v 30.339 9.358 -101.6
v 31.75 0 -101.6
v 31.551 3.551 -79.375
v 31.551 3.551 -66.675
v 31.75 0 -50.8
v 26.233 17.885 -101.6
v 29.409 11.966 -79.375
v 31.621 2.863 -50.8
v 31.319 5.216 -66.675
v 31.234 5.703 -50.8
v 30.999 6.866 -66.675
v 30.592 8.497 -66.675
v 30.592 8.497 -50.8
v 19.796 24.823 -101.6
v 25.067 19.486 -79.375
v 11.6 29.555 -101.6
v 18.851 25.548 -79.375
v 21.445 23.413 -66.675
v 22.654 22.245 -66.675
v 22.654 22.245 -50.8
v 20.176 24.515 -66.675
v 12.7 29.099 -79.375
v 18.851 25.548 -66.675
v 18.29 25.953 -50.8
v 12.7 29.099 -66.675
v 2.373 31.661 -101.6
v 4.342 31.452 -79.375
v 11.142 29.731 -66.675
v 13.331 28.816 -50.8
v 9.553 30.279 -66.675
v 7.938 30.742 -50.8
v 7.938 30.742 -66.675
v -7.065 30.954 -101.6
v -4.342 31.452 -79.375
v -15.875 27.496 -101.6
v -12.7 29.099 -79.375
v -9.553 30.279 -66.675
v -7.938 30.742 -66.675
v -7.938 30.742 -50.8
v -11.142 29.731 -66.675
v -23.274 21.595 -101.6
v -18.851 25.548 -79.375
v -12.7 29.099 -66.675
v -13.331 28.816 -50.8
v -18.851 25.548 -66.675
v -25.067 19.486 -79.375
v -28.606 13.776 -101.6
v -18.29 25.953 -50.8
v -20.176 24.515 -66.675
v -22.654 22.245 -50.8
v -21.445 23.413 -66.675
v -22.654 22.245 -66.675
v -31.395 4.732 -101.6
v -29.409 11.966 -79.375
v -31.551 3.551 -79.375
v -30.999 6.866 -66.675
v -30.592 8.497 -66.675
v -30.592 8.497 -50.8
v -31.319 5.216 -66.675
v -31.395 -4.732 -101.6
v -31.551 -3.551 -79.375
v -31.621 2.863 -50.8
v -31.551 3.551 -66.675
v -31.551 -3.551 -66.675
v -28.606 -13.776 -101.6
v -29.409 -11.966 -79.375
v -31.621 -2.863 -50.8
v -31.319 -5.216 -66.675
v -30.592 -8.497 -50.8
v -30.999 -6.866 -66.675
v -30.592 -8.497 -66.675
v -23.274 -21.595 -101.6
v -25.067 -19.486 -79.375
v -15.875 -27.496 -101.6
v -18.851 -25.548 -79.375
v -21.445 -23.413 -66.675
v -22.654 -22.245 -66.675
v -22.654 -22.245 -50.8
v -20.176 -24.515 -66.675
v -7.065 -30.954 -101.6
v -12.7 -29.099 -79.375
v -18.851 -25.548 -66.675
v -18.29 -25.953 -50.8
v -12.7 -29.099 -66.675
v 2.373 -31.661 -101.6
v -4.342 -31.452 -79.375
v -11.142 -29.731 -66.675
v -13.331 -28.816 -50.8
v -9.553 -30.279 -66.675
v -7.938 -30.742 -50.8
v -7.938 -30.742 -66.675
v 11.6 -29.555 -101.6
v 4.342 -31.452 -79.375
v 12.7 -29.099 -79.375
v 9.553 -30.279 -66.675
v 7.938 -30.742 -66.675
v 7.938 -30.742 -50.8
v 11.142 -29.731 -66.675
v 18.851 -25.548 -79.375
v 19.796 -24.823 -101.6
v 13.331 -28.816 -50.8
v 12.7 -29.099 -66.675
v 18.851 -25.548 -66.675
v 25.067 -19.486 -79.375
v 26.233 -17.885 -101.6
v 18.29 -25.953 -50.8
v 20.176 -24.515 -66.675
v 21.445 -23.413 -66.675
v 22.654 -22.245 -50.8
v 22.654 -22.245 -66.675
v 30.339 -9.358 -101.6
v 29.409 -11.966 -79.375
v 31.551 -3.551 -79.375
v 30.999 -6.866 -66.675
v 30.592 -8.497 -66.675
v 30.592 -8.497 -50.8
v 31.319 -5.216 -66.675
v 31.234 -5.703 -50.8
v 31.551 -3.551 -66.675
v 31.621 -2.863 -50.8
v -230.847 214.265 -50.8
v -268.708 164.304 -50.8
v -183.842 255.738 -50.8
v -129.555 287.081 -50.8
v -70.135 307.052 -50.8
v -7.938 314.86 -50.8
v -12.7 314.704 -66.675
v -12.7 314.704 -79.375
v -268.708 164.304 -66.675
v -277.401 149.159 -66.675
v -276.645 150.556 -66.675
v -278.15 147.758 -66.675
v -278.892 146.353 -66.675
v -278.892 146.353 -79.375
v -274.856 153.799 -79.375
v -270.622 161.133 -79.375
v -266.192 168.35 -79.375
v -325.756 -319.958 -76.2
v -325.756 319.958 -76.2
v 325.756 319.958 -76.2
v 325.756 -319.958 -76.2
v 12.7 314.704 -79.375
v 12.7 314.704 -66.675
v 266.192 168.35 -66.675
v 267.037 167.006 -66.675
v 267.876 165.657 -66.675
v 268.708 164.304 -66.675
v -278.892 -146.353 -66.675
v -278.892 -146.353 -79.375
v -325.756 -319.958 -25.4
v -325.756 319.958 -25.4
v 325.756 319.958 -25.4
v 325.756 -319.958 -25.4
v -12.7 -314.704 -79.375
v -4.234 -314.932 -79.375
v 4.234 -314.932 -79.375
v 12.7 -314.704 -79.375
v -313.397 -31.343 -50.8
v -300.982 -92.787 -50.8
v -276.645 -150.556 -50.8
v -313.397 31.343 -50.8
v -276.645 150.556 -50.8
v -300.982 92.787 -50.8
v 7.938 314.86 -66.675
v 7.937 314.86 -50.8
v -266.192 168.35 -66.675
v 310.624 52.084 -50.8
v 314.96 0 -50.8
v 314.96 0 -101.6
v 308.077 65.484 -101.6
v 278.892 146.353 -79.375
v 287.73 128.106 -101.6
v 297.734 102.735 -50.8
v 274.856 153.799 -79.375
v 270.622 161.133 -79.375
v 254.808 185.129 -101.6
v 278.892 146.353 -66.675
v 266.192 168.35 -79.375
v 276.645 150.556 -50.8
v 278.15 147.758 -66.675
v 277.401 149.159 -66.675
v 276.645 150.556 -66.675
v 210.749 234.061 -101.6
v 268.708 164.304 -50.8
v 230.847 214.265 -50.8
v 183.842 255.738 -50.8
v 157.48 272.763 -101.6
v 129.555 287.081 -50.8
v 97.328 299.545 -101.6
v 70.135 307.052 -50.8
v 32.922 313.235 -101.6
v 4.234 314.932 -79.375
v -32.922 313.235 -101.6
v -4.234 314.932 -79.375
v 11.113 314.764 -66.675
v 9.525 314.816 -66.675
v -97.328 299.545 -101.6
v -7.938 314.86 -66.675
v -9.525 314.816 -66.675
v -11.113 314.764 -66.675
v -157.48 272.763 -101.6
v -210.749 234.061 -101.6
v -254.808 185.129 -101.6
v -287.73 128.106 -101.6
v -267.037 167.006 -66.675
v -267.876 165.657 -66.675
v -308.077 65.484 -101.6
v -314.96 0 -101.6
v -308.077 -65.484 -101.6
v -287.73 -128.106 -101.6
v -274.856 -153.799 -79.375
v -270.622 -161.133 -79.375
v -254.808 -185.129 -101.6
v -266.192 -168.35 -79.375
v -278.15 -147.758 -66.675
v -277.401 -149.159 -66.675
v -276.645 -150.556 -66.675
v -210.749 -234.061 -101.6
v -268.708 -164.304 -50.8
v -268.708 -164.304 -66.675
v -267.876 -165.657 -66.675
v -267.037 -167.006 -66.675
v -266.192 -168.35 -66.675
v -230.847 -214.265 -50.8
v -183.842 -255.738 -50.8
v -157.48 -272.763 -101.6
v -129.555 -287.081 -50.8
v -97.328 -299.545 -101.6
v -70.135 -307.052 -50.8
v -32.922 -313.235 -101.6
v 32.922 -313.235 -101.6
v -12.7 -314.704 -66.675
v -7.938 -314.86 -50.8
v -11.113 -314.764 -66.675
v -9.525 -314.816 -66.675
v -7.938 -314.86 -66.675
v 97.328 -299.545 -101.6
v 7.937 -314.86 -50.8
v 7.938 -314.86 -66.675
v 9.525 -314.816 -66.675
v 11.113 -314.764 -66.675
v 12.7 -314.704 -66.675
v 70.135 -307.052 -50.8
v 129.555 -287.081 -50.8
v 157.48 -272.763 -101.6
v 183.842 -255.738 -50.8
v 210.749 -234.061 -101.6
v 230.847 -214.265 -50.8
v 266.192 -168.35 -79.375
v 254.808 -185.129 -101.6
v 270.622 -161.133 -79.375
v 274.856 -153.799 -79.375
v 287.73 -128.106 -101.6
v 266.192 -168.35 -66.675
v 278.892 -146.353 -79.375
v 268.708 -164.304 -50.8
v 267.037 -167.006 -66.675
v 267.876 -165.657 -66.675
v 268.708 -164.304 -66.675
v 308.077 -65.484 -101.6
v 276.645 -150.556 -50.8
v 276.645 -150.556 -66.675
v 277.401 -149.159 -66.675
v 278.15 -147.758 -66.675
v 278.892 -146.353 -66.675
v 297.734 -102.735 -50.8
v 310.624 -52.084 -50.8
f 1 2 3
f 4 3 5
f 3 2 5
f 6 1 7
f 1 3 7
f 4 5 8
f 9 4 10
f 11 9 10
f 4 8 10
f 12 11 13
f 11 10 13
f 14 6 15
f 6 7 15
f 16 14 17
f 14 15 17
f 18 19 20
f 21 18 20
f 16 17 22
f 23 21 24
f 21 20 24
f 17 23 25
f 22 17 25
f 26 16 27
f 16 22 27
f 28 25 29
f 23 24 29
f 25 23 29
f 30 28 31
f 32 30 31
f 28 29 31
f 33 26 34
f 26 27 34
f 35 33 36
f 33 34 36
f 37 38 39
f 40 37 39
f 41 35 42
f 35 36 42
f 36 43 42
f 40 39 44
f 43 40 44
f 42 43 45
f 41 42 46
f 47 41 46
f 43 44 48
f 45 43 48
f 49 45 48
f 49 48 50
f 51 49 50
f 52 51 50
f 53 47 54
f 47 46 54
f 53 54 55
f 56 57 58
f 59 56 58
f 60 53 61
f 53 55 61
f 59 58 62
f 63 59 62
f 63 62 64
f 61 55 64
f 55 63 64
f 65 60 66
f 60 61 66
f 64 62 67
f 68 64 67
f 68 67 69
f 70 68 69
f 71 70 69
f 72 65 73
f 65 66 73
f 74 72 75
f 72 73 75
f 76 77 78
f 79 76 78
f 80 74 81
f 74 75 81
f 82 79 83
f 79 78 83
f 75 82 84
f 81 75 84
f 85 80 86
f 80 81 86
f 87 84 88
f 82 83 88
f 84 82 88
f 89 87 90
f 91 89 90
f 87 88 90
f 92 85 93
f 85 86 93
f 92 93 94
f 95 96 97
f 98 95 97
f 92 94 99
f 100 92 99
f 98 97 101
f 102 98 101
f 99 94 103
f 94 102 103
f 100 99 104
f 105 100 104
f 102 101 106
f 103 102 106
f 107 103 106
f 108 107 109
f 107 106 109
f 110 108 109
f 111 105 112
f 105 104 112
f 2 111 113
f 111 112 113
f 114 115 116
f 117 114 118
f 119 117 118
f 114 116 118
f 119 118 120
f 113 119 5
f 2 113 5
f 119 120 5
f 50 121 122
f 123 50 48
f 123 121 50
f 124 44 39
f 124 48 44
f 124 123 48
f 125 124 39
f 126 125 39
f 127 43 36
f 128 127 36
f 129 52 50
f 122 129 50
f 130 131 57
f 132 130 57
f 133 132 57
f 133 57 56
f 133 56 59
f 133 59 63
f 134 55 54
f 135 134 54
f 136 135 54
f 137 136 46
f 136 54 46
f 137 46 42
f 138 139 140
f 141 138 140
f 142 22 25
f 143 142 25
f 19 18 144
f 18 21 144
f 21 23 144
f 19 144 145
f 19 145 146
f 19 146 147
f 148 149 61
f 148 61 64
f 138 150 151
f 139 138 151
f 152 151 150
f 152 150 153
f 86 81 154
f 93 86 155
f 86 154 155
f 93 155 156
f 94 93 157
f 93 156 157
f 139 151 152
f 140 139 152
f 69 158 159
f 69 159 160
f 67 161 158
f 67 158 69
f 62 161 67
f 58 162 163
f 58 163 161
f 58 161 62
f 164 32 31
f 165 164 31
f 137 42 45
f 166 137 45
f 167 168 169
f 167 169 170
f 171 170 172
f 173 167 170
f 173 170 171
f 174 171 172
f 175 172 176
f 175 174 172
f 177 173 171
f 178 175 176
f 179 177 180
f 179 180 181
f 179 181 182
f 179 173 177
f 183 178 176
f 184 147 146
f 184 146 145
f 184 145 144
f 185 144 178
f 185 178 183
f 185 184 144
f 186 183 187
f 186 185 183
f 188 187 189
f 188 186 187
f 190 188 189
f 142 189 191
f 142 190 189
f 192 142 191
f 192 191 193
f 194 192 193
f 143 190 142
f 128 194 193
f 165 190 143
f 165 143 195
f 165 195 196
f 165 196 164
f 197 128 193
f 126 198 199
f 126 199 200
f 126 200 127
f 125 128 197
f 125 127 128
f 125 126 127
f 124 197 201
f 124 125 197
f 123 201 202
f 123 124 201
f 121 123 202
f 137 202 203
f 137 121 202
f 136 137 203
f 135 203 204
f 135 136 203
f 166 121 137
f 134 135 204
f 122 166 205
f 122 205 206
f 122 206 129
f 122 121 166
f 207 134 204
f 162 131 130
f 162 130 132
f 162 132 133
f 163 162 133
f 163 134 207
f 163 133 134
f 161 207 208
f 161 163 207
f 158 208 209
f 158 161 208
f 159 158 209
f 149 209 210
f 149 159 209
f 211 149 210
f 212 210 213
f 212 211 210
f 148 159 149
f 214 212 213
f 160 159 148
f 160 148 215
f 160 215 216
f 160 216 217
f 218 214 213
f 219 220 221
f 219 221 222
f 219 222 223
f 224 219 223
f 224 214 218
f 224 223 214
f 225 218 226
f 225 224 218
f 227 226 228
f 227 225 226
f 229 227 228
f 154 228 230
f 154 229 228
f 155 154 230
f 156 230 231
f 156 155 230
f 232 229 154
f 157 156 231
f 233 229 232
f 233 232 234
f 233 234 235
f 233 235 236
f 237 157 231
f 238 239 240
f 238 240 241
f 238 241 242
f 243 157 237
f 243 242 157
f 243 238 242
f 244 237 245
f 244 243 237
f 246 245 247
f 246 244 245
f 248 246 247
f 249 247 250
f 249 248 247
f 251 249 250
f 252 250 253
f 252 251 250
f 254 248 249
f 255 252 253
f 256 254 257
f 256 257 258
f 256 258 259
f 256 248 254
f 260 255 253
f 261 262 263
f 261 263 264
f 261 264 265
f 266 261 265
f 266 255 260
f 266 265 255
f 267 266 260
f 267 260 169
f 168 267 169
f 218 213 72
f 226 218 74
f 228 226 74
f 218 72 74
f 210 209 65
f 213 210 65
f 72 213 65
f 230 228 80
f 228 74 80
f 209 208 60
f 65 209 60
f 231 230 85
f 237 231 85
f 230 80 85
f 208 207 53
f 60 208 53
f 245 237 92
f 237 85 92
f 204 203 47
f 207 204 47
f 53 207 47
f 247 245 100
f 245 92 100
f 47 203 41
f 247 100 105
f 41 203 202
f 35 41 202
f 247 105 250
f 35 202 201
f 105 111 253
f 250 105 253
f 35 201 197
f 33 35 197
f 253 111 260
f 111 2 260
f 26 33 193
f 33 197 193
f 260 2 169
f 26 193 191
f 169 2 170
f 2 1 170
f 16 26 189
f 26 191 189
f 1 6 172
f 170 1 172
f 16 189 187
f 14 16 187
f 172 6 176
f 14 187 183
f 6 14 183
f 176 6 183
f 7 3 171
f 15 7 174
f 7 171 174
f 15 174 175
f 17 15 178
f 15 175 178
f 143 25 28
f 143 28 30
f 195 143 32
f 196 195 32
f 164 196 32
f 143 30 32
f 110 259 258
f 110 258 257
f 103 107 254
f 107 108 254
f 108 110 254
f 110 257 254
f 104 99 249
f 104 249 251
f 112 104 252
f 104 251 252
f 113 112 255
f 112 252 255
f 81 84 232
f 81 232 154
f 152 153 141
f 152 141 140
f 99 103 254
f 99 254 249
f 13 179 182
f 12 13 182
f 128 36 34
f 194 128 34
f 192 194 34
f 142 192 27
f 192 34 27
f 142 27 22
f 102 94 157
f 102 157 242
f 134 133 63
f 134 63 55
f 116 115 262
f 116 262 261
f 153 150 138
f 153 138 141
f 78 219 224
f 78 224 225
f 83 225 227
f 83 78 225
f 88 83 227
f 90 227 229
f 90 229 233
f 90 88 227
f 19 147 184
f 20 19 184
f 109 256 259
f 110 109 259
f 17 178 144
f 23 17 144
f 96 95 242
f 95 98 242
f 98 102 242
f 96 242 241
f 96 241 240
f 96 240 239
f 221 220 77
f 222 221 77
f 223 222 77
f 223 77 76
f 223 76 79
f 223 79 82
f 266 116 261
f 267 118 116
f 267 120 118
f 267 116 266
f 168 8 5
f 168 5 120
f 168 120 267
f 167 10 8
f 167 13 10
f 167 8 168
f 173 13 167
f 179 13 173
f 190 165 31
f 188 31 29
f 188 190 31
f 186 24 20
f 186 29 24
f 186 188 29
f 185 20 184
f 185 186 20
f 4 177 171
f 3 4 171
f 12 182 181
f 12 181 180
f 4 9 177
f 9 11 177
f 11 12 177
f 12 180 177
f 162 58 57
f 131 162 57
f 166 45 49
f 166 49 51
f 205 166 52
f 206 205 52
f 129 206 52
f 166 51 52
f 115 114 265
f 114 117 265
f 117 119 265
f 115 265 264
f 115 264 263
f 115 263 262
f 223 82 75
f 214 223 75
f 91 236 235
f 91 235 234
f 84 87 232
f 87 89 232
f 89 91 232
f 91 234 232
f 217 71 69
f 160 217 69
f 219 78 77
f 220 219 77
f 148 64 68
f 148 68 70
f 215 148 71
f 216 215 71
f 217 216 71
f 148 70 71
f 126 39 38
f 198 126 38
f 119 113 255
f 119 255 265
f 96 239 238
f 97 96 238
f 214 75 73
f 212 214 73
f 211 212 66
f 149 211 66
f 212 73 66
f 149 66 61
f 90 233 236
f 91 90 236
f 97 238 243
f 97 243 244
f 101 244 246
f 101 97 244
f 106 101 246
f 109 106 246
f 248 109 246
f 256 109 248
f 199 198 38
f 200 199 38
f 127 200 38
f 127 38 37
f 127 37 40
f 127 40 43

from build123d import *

# Parameters (mm, degrees)
F1_START        = -50.8
F0_R            = 314.96
F0_R_2          = 31.75
F1_DEPTH        = 50.8
F3_DEPTH        = 314.96
F3_COPIES_COUNT = 3
F3_COPIES_ANGLE = 120
F5_START        = -25.4
F4_W            = 651.5112519264
F4_H            = 639.9160027504
F5_DEPTH        = 50.8


# Not quite as in the source:
# - a pattern or mirror of a feature is missing from the dataset's text; its kind, count and spacing are read off the source's solid


with BuildPart() as f1:
    # F0 (on Top) → F1 (new body)
    with BuildSketch(Plane.XY.offset(F1_START)):
        Circle(F0_R)
        Circle(F0_R_2, mode=Mode.SUBTRACT)
    extrude(amount=-F1_DEPTH)

    # F2 (on Front) → F3 (cut, symmetric)
    with BuildSketch(Plane.XZ):
        Polygon((7.9375, -50.8), (0, -50.8), (-7.9375, -50.8), (-7.9375, -66.675), (-12.7, -66.675), (-12.7, -79.375), (0, -79.375), (12.7, -79.375), (12.7, -66.675), (7.9375, -66.675), align=None)
    f3 = extrude(amount=F3_DEPTH, both=True, mode=Mode.SUBTRACT)

    # F3_copies: F3 ×3 about axis
    f3_copies_axis = Axis((0, 0, 0), (0, 0, 1))
    for i in range(1, F3_COPIES_COUNT):
        add(f3.rotate(f3_copies_axis, i * F3_COPIES_ANGLE / (F3_COPIES_COUNT - 1)), mode=Mode.SUBTRACT)


with BuildPart() as f5:
    # F4 (on Top) → F5 (new body)
    with BuildSketch(Plane.XY.offset(F5_START)):
        Rectangle(F4_W, F4_H)
    extrude(amount=-F5_DEPTH)


solid = Compound([f1.part, f5.part])
